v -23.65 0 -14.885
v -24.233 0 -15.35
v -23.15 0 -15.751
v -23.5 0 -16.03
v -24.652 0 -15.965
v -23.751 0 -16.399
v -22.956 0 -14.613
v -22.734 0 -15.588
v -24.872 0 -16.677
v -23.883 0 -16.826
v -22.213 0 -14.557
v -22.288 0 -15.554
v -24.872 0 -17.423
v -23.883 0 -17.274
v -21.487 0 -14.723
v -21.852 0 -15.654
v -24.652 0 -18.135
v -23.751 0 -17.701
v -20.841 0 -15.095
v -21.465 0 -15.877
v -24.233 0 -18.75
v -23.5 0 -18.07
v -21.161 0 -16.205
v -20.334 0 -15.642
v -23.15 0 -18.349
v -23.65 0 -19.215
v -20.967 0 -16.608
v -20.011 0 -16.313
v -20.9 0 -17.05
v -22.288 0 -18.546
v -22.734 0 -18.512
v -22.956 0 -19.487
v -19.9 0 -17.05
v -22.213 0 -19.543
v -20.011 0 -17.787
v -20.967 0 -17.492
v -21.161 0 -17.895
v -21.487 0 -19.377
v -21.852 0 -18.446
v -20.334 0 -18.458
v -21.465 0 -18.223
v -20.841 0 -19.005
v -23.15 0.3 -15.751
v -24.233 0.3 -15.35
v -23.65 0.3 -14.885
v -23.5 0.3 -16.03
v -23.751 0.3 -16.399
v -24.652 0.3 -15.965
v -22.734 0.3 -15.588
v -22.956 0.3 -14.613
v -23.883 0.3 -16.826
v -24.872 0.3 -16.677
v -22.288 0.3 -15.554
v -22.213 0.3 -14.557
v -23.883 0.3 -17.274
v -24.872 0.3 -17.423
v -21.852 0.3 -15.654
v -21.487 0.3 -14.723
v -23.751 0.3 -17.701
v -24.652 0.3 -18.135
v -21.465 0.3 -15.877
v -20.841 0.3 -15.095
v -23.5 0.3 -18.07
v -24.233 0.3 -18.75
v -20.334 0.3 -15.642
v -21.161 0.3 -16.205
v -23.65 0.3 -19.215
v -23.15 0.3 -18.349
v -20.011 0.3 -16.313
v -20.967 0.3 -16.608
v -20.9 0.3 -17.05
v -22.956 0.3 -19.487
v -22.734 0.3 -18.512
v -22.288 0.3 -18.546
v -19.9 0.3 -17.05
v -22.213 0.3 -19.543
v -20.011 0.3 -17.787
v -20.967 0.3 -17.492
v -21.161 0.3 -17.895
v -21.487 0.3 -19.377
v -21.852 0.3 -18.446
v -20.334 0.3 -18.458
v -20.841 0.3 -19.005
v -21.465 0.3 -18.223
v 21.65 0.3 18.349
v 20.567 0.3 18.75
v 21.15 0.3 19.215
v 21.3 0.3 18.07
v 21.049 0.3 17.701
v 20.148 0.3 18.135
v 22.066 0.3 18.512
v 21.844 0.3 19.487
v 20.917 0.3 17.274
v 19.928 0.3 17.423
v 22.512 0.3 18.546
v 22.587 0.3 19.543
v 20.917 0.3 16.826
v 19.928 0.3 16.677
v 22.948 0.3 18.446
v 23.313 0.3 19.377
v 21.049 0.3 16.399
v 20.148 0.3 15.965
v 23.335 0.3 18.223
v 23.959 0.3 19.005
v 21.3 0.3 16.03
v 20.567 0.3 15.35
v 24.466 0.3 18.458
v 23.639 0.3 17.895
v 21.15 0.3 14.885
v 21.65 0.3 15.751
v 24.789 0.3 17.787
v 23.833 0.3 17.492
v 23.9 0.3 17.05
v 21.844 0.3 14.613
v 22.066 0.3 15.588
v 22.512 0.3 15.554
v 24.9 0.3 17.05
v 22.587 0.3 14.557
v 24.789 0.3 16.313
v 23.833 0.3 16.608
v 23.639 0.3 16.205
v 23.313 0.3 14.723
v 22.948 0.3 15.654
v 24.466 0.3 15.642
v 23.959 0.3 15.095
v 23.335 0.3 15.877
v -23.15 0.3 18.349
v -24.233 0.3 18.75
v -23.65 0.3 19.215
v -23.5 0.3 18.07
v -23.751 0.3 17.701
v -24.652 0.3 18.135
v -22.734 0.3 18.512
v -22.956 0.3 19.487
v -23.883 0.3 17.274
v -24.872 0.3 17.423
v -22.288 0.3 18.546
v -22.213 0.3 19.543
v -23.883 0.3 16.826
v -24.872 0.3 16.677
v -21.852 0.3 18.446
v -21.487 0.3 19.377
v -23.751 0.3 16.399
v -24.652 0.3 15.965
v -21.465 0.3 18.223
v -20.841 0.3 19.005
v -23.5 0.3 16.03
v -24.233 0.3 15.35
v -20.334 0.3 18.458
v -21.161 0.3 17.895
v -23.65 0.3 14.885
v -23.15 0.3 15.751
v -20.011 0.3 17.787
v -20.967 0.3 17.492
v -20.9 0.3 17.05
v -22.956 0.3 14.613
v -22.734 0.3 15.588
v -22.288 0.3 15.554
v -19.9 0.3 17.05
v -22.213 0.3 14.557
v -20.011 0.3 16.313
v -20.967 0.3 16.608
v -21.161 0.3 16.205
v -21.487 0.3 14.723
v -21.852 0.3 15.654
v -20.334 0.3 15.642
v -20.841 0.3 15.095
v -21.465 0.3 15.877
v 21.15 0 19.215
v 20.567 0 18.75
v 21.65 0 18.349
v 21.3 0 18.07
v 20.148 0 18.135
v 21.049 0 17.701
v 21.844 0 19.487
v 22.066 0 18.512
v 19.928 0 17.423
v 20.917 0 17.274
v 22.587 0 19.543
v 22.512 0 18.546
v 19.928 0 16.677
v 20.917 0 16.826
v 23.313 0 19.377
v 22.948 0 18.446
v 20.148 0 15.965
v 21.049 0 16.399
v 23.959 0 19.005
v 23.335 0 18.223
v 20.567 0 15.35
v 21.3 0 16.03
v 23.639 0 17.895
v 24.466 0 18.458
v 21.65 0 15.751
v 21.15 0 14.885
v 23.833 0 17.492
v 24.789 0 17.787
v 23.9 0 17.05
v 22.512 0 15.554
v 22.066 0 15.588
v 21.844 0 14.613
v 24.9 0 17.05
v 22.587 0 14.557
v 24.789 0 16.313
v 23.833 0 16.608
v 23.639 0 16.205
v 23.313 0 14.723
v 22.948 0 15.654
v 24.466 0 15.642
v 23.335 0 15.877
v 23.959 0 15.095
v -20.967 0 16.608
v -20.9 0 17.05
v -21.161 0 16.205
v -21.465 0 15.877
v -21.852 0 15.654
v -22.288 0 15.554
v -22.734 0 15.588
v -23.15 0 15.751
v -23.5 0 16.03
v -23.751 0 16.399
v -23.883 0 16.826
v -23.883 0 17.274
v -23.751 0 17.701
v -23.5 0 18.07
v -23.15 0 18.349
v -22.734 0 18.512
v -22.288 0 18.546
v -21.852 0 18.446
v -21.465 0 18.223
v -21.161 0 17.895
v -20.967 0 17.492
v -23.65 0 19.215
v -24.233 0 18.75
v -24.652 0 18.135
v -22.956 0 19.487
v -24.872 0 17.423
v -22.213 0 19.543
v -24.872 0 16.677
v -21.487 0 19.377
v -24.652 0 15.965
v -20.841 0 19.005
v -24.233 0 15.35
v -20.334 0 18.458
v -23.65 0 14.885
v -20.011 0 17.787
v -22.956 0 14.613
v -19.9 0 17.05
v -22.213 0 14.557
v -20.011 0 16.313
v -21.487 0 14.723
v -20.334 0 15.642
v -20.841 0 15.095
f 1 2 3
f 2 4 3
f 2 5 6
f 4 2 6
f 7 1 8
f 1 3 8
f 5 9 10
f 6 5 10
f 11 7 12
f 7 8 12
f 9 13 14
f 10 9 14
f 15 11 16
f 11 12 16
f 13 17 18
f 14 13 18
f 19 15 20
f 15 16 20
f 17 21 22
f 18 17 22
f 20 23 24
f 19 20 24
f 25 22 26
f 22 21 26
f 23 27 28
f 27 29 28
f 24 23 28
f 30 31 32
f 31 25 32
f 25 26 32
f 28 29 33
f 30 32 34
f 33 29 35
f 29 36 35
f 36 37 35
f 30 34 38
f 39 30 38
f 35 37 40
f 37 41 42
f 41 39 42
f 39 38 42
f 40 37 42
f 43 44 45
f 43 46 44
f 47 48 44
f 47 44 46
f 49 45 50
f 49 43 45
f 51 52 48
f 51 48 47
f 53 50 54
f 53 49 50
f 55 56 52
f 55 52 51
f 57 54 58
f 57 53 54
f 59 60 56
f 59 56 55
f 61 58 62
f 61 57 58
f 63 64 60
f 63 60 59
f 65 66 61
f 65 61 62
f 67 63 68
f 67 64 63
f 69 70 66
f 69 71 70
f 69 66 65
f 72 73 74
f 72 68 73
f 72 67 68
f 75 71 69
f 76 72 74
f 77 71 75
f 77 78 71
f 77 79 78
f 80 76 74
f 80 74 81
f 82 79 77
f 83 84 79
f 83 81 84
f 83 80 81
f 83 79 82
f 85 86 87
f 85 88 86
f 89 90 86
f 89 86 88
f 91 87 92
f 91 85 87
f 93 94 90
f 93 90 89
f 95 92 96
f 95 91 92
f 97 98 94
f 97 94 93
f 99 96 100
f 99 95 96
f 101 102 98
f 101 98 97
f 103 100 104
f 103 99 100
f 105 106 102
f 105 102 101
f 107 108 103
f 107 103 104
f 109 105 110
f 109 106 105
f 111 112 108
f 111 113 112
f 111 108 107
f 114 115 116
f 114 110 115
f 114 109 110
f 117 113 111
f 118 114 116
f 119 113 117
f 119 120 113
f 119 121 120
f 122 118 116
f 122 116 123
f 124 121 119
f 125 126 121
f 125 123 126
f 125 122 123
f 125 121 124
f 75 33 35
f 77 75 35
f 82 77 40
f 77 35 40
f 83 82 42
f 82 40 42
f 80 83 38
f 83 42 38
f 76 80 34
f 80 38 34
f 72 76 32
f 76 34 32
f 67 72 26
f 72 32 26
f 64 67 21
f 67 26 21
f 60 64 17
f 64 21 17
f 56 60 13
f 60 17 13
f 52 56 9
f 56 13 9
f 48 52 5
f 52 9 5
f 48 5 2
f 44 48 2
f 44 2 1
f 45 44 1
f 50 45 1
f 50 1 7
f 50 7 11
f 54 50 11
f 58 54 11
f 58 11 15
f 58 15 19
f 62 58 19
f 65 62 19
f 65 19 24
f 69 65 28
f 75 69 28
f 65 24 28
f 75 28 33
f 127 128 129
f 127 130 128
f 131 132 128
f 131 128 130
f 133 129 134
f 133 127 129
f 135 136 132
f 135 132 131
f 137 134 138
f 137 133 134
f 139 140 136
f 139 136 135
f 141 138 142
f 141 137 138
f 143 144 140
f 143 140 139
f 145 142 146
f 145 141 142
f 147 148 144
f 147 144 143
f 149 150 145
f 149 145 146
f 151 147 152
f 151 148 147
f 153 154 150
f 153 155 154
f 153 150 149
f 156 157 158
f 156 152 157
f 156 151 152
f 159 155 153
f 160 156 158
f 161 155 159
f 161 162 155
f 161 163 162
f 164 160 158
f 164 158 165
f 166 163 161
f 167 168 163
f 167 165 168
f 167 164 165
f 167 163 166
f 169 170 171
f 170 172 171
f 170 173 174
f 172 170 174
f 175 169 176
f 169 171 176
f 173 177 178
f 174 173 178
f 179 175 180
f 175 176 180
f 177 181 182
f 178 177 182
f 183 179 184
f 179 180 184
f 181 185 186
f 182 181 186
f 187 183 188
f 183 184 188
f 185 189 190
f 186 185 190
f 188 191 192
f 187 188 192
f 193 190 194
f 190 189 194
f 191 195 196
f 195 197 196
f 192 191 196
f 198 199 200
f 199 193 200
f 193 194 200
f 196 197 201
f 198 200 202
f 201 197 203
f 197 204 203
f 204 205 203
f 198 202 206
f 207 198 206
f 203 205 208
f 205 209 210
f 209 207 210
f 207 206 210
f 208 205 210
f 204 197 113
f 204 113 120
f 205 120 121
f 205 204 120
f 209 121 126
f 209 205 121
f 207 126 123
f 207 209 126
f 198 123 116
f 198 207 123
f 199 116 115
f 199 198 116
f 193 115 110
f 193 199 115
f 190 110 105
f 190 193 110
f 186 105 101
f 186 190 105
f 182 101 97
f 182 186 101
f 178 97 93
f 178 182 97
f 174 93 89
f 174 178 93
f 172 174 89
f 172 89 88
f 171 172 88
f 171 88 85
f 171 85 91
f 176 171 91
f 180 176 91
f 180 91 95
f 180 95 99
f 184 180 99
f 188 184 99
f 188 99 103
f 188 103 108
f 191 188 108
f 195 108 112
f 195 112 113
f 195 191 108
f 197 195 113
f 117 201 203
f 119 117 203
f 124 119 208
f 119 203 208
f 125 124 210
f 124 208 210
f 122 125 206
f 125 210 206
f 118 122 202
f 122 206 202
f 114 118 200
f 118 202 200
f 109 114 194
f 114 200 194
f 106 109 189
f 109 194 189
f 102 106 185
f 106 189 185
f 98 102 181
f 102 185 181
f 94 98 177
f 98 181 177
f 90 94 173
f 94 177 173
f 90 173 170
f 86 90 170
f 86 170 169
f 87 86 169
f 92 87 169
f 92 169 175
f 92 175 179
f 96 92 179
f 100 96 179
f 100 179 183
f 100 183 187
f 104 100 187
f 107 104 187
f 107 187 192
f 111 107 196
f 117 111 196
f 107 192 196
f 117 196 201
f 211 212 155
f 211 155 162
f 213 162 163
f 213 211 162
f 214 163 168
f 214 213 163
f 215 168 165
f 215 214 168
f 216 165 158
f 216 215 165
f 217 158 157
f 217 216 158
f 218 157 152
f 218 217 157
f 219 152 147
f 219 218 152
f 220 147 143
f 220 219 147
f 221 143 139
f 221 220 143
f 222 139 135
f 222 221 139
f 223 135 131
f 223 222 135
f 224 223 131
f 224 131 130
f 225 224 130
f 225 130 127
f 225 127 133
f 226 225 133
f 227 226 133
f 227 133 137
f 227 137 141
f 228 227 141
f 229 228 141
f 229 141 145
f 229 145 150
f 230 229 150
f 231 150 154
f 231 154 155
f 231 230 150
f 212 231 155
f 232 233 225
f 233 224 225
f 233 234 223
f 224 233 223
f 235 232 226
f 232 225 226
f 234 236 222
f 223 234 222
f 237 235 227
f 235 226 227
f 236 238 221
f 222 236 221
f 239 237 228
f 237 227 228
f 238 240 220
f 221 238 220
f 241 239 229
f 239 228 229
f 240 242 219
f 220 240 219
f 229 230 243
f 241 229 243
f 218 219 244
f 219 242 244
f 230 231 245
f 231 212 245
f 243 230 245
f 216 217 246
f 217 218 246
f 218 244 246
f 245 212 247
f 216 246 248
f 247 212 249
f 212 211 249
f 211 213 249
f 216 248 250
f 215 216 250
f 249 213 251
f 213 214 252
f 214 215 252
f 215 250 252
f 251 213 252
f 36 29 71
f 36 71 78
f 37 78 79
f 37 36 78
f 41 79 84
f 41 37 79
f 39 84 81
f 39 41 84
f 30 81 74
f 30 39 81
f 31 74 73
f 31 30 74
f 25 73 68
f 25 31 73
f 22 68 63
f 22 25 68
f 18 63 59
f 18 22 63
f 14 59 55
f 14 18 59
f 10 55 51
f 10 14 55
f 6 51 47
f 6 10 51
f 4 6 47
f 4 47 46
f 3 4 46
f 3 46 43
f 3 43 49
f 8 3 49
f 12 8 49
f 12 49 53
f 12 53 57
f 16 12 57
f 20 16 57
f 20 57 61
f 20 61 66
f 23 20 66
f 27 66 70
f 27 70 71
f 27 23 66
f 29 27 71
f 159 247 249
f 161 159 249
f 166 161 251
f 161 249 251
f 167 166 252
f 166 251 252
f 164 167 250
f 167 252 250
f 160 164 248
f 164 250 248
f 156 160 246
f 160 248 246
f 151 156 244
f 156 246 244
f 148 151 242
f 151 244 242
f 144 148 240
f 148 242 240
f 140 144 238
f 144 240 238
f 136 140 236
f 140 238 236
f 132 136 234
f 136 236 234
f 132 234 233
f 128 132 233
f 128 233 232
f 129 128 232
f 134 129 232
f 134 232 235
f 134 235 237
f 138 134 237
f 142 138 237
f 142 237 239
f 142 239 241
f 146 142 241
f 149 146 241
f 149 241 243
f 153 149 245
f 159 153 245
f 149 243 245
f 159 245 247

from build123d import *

# Parameters (mm, degrees)
SKETCH1_R             = 2.5
SKETCH1_R_2           = 1.5
BOSS_EXTRUDE1_DEPTH   = 0.3
BOSS_EXTRUDE1_2_DEPTH = 0.3
BOSS_EXTRUDE1_3_DEPTH = 0.3


with BuildPart() as part:
    # Sketch1 → Boss-Extrude1 (new body)
    with BuildSketch(Plane(origin=(0, 0, 0), x_dir=(1, 0, 0), z_dir=(0, 1, 0))):
        with Locations((-22.4, 17.05)):
            Circle(SKETCH1_R)
        with Locations((-22.4, 17.05)):
            Circle(SKETCH1_R_2, mode=Mode.SUBTRACT)
    extrude(amount=BOSS_EXTRUDE1_DEPTH)


with BuildPart() as body_2:
    # Sketch1 → Boss-Extrude1 2 (new body)
    with BuildSketch(Plane(origin=(0, 0, 0), x_dir=(1, 0, 0), z_dir=(0, 1, 0))):
        with Locations((-22.4, -17.05)):
            Circle(SKETCH1_R)
        with Locations((-22.4, -17.05)):
            Circle(SKETCH1_R_2, mode=Mode.SUBTRACT)
    extrude(amount=BOSS_EXTRUDE1_2_DEPTH)


with BuildPart() as body_3:
    # Sketch1 → Boss-Extrude1 3 (new body)
    with BuildSketch(Plane(origin=(0, 0, 0), x_dir=(1, 0, 0), z_dir=(0, 1, 0))):
        with Locations((22.4, -17.05)):
            Circle(SKETCH1_R)
        with Locations((22.4, -17.05)):
            Circle(SKETCH1_R_2, mode=Mode.SUBTRACT)
    extrude(amount=BOSS_EXTRUDE1_3_DEPTH)


solid = Compound([part.part, body_2.part, body_3.part])
